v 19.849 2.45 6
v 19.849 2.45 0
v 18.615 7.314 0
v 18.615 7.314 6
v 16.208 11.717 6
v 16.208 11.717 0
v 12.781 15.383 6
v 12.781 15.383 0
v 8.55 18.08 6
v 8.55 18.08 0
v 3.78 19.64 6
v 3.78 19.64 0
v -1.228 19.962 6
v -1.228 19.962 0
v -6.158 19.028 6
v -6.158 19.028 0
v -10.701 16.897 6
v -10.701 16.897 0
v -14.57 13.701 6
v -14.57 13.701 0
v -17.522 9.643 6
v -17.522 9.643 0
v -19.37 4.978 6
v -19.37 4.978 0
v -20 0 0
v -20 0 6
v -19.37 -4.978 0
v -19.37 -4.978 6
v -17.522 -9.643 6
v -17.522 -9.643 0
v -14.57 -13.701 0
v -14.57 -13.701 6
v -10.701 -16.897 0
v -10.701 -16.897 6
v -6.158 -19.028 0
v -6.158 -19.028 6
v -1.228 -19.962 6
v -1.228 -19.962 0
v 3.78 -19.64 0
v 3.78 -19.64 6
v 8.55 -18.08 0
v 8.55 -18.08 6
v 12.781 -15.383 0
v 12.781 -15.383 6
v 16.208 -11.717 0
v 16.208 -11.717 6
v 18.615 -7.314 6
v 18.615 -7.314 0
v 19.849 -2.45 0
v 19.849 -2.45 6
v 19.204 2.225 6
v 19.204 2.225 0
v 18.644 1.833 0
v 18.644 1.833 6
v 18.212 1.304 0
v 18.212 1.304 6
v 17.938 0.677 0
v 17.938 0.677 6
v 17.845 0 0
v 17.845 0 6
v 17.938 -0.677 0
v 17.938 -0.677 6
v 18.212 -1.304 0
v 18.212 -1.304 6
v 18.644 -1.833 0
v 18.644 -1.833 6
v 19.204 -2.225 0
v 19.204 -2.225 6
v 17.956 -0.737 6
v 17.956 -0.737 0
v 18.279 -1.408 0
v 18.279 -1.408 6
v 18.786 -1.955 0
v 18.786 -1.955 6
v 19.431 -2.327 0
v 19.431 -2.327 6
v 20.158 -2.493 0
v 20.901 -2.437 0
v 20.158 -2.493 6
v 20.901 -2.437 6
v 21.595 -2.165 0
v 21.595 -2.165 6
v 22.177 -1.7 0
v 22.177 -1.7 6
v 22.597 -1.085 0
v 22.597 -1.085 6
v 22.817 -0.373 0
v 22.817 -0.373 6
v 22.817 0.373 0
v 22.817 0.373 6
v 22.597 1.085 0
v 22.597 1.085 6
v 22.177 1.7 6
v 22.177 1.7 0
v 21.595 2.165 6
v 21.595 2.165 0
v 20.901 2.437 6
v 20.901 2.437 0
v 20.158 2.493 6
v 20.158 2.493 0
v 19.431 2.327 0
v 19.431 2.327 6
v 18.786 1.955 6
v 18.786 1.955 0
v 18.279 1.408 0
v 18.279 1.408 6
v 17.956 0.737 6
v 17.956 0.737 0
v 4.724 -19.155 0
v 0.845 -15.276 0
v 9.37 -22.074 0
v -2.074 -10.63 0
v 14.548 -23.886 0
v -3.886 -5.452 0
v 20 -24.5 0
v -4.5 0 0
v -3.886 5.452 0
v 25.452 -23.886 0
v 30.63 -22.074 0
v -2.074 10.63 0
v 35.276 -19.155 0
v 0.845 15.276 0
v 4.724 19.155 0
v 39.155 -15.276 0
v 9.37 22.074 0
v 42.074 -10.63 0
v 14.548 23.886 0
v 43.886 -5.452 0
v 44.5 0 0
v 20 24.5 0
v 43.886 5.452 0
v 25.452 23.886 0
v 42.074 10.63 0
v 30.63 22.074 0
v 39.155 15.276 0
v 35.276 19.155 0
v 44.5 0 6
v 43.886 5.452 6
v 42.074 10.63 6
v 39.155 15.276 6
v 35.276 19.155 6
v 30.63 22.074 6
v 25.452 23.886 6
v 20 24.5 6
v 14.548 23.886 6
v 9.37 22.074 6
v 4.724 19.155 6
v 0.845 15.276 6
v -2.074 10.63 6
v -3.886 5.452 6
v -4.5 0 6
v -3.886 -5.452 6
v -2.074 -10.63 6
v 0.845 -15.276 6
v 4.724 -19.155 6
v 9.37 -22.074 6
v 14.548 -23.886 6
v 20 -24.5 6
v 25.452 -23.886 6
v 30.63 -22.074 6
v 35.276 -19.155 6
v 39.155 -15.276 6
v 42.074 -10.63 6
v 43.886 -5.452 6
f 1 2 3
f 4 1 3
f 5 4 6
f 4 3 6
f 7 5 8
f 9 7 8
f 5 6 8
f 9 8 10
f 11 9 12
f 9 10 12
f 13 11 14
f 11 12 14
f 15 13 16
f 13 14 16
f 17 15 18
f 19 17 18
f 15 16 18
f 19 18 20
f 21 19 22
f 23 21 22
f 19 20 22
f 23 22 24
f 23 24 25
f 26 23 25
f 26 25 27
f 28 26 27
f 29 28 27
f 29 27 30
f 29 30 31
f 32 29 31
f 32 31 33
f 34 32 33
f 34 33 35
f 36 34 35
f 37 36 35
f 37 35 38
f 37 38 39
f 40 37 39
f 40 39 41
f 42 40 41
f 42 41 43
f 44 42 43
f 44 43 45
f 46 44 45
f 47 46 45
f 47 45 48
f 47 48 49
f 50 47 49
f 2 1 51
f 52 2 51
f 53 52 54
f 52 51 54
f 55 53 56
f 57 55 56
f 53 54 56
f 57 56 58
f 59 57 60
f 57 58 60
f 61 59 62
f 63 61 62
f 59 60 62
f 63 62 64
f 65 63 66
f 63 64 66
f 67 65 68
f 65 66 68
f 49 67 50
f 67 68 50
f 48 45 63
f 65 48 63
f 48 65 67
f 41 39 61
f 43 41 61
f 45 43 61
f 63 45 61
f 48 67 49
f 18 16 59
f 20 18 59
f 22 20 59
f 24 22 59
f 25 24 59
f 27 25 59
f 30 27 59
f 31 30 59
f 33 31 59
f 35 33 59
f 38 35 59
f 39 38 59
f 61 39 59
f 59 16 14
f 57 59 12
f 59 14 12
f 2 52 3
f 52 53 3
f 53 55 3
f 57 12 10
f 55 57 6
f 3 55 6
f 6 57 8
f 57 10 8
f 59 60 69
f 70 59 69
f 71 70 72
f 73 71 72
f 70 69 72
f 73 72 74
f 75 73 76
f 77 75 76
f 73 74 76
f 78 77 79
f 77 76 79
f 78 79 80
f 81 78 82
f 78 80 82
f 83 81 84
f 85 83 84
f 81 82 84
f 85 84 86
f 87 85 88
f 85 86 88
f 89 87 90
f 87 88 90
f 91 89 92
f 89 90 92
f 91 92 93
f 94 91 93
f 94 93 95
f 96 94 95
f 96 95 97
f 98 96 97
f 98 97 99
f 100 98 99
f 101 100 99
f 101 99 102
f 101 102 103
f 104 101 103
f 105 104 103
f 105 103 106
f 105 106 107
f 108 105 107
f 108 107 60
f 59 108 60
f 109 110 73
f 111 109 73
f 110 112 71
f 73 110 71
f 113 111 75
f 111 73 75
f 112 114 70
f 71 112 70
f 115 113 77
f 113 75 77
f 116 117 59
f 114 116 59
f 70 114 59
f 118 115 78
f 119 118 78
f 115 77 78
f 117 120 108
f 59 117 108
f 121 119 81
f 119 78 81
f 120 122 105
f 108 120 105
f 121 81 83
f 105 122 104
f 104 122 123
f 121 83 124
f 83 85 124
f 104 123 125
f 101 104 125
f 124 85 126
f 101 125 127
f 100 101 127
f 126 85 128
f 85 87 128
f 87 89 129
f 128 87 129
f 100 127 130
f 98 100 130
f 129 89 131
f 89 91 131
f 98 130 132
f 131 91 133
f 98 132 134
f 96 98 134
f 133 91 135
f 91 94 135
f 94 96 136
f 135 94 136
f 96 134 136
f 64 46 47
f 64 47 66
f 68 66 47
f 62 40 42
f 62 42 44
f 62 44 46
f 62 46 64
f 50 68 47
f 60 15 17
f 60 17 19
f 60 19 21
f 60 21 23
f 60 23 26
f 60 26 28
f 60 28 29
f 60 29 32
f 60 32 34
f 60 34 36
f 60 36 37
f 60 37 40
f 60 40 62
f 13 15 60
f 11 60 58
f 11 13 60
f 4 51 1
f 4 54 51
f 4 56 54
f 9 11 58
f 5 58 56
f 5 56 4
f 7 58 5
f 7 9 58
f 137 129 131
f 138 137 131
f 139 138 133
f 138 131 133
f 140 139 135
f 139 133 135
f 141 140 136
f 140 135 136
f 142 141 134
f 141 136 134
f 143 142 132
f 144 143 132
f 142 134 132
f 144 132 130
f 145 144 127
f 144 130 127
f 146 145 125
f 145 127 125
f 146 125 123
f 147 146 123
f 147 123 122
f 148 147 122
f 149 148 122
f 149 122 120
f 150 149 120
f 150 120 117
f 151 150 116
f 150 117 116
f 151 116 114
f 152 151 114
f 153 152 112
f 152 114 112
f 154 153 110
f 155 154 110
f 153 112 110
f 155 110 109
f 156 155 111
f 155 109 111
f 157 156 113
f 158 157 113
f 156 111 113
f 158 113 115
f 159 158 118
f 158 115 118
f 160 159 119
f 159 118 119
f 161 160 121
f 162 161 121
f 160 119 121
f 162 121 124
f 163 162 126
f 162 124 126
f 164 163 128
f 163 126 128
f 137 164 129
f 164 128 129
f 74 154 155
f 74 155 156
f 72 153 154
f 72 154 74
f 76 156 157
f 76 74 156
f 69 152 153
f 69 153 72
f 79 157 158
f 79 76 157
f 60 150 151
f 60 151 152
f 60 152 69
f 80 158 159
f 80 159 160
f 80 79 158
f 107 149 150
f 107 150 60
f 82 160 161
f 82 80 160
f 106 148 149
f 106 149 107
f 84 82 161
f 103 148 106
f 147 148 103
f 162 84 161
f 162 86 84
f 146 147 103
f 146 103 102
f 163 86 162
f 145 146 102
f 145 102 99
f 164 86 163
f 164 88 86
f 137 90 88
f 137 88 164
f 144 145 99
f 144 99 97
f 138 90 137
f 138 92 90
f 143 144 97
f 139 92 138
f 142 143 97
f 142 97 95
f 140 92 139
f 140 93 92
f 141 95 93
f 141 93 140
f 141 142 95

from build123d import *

# Parameters (mm, degrees)
F0_R     = 20
F1_DEPTH = 6
F4_R     = 24.5
F5_DEPTH = 6
F8_D     = 5
F8_2_D   = 5


# Not quite as in the source:
# - a feature of the source that left no trace in its solid (it failed there, or was rolled back) is left out
# - the program builds the solid bodies; features that only make, move or delete a surface that nothing else refers to are left out


with BuildPart() as f1:
    # F0 (on Top) → F1 (new body)
    with BuildSketch(Plane.XY):
        Circle(F0_R)
    extrude(amount=F1_DEPTH)

    # F8 (through all)
    with Locations(Plane(origin=(0, 0, 0), x_dir=(1, 0, 0), z_dir=(0, 0, -1))):
        with Locations((20.3447919339, 0)):
            Hole(F8_D / 2)


with BuildPart() as f5:
    # F4 (on Top) → F5 (new body)
    with BuildSketch(Plane.XY):
        with Locations((20, 0)):
            Circle(F4_R)
    extrude(amount=F5_DEPTH)

    # F8#2 (through all)
    with Locations(Plane(origin=(0, 0, 0), x_dir=(1, 0, 0), z_dir=(0, 0, -1))):
        with Locations((20.3447919339, 0)):
            Hole(F8_2_D / 2)


solid = Compound([f1.part, f5.part])
